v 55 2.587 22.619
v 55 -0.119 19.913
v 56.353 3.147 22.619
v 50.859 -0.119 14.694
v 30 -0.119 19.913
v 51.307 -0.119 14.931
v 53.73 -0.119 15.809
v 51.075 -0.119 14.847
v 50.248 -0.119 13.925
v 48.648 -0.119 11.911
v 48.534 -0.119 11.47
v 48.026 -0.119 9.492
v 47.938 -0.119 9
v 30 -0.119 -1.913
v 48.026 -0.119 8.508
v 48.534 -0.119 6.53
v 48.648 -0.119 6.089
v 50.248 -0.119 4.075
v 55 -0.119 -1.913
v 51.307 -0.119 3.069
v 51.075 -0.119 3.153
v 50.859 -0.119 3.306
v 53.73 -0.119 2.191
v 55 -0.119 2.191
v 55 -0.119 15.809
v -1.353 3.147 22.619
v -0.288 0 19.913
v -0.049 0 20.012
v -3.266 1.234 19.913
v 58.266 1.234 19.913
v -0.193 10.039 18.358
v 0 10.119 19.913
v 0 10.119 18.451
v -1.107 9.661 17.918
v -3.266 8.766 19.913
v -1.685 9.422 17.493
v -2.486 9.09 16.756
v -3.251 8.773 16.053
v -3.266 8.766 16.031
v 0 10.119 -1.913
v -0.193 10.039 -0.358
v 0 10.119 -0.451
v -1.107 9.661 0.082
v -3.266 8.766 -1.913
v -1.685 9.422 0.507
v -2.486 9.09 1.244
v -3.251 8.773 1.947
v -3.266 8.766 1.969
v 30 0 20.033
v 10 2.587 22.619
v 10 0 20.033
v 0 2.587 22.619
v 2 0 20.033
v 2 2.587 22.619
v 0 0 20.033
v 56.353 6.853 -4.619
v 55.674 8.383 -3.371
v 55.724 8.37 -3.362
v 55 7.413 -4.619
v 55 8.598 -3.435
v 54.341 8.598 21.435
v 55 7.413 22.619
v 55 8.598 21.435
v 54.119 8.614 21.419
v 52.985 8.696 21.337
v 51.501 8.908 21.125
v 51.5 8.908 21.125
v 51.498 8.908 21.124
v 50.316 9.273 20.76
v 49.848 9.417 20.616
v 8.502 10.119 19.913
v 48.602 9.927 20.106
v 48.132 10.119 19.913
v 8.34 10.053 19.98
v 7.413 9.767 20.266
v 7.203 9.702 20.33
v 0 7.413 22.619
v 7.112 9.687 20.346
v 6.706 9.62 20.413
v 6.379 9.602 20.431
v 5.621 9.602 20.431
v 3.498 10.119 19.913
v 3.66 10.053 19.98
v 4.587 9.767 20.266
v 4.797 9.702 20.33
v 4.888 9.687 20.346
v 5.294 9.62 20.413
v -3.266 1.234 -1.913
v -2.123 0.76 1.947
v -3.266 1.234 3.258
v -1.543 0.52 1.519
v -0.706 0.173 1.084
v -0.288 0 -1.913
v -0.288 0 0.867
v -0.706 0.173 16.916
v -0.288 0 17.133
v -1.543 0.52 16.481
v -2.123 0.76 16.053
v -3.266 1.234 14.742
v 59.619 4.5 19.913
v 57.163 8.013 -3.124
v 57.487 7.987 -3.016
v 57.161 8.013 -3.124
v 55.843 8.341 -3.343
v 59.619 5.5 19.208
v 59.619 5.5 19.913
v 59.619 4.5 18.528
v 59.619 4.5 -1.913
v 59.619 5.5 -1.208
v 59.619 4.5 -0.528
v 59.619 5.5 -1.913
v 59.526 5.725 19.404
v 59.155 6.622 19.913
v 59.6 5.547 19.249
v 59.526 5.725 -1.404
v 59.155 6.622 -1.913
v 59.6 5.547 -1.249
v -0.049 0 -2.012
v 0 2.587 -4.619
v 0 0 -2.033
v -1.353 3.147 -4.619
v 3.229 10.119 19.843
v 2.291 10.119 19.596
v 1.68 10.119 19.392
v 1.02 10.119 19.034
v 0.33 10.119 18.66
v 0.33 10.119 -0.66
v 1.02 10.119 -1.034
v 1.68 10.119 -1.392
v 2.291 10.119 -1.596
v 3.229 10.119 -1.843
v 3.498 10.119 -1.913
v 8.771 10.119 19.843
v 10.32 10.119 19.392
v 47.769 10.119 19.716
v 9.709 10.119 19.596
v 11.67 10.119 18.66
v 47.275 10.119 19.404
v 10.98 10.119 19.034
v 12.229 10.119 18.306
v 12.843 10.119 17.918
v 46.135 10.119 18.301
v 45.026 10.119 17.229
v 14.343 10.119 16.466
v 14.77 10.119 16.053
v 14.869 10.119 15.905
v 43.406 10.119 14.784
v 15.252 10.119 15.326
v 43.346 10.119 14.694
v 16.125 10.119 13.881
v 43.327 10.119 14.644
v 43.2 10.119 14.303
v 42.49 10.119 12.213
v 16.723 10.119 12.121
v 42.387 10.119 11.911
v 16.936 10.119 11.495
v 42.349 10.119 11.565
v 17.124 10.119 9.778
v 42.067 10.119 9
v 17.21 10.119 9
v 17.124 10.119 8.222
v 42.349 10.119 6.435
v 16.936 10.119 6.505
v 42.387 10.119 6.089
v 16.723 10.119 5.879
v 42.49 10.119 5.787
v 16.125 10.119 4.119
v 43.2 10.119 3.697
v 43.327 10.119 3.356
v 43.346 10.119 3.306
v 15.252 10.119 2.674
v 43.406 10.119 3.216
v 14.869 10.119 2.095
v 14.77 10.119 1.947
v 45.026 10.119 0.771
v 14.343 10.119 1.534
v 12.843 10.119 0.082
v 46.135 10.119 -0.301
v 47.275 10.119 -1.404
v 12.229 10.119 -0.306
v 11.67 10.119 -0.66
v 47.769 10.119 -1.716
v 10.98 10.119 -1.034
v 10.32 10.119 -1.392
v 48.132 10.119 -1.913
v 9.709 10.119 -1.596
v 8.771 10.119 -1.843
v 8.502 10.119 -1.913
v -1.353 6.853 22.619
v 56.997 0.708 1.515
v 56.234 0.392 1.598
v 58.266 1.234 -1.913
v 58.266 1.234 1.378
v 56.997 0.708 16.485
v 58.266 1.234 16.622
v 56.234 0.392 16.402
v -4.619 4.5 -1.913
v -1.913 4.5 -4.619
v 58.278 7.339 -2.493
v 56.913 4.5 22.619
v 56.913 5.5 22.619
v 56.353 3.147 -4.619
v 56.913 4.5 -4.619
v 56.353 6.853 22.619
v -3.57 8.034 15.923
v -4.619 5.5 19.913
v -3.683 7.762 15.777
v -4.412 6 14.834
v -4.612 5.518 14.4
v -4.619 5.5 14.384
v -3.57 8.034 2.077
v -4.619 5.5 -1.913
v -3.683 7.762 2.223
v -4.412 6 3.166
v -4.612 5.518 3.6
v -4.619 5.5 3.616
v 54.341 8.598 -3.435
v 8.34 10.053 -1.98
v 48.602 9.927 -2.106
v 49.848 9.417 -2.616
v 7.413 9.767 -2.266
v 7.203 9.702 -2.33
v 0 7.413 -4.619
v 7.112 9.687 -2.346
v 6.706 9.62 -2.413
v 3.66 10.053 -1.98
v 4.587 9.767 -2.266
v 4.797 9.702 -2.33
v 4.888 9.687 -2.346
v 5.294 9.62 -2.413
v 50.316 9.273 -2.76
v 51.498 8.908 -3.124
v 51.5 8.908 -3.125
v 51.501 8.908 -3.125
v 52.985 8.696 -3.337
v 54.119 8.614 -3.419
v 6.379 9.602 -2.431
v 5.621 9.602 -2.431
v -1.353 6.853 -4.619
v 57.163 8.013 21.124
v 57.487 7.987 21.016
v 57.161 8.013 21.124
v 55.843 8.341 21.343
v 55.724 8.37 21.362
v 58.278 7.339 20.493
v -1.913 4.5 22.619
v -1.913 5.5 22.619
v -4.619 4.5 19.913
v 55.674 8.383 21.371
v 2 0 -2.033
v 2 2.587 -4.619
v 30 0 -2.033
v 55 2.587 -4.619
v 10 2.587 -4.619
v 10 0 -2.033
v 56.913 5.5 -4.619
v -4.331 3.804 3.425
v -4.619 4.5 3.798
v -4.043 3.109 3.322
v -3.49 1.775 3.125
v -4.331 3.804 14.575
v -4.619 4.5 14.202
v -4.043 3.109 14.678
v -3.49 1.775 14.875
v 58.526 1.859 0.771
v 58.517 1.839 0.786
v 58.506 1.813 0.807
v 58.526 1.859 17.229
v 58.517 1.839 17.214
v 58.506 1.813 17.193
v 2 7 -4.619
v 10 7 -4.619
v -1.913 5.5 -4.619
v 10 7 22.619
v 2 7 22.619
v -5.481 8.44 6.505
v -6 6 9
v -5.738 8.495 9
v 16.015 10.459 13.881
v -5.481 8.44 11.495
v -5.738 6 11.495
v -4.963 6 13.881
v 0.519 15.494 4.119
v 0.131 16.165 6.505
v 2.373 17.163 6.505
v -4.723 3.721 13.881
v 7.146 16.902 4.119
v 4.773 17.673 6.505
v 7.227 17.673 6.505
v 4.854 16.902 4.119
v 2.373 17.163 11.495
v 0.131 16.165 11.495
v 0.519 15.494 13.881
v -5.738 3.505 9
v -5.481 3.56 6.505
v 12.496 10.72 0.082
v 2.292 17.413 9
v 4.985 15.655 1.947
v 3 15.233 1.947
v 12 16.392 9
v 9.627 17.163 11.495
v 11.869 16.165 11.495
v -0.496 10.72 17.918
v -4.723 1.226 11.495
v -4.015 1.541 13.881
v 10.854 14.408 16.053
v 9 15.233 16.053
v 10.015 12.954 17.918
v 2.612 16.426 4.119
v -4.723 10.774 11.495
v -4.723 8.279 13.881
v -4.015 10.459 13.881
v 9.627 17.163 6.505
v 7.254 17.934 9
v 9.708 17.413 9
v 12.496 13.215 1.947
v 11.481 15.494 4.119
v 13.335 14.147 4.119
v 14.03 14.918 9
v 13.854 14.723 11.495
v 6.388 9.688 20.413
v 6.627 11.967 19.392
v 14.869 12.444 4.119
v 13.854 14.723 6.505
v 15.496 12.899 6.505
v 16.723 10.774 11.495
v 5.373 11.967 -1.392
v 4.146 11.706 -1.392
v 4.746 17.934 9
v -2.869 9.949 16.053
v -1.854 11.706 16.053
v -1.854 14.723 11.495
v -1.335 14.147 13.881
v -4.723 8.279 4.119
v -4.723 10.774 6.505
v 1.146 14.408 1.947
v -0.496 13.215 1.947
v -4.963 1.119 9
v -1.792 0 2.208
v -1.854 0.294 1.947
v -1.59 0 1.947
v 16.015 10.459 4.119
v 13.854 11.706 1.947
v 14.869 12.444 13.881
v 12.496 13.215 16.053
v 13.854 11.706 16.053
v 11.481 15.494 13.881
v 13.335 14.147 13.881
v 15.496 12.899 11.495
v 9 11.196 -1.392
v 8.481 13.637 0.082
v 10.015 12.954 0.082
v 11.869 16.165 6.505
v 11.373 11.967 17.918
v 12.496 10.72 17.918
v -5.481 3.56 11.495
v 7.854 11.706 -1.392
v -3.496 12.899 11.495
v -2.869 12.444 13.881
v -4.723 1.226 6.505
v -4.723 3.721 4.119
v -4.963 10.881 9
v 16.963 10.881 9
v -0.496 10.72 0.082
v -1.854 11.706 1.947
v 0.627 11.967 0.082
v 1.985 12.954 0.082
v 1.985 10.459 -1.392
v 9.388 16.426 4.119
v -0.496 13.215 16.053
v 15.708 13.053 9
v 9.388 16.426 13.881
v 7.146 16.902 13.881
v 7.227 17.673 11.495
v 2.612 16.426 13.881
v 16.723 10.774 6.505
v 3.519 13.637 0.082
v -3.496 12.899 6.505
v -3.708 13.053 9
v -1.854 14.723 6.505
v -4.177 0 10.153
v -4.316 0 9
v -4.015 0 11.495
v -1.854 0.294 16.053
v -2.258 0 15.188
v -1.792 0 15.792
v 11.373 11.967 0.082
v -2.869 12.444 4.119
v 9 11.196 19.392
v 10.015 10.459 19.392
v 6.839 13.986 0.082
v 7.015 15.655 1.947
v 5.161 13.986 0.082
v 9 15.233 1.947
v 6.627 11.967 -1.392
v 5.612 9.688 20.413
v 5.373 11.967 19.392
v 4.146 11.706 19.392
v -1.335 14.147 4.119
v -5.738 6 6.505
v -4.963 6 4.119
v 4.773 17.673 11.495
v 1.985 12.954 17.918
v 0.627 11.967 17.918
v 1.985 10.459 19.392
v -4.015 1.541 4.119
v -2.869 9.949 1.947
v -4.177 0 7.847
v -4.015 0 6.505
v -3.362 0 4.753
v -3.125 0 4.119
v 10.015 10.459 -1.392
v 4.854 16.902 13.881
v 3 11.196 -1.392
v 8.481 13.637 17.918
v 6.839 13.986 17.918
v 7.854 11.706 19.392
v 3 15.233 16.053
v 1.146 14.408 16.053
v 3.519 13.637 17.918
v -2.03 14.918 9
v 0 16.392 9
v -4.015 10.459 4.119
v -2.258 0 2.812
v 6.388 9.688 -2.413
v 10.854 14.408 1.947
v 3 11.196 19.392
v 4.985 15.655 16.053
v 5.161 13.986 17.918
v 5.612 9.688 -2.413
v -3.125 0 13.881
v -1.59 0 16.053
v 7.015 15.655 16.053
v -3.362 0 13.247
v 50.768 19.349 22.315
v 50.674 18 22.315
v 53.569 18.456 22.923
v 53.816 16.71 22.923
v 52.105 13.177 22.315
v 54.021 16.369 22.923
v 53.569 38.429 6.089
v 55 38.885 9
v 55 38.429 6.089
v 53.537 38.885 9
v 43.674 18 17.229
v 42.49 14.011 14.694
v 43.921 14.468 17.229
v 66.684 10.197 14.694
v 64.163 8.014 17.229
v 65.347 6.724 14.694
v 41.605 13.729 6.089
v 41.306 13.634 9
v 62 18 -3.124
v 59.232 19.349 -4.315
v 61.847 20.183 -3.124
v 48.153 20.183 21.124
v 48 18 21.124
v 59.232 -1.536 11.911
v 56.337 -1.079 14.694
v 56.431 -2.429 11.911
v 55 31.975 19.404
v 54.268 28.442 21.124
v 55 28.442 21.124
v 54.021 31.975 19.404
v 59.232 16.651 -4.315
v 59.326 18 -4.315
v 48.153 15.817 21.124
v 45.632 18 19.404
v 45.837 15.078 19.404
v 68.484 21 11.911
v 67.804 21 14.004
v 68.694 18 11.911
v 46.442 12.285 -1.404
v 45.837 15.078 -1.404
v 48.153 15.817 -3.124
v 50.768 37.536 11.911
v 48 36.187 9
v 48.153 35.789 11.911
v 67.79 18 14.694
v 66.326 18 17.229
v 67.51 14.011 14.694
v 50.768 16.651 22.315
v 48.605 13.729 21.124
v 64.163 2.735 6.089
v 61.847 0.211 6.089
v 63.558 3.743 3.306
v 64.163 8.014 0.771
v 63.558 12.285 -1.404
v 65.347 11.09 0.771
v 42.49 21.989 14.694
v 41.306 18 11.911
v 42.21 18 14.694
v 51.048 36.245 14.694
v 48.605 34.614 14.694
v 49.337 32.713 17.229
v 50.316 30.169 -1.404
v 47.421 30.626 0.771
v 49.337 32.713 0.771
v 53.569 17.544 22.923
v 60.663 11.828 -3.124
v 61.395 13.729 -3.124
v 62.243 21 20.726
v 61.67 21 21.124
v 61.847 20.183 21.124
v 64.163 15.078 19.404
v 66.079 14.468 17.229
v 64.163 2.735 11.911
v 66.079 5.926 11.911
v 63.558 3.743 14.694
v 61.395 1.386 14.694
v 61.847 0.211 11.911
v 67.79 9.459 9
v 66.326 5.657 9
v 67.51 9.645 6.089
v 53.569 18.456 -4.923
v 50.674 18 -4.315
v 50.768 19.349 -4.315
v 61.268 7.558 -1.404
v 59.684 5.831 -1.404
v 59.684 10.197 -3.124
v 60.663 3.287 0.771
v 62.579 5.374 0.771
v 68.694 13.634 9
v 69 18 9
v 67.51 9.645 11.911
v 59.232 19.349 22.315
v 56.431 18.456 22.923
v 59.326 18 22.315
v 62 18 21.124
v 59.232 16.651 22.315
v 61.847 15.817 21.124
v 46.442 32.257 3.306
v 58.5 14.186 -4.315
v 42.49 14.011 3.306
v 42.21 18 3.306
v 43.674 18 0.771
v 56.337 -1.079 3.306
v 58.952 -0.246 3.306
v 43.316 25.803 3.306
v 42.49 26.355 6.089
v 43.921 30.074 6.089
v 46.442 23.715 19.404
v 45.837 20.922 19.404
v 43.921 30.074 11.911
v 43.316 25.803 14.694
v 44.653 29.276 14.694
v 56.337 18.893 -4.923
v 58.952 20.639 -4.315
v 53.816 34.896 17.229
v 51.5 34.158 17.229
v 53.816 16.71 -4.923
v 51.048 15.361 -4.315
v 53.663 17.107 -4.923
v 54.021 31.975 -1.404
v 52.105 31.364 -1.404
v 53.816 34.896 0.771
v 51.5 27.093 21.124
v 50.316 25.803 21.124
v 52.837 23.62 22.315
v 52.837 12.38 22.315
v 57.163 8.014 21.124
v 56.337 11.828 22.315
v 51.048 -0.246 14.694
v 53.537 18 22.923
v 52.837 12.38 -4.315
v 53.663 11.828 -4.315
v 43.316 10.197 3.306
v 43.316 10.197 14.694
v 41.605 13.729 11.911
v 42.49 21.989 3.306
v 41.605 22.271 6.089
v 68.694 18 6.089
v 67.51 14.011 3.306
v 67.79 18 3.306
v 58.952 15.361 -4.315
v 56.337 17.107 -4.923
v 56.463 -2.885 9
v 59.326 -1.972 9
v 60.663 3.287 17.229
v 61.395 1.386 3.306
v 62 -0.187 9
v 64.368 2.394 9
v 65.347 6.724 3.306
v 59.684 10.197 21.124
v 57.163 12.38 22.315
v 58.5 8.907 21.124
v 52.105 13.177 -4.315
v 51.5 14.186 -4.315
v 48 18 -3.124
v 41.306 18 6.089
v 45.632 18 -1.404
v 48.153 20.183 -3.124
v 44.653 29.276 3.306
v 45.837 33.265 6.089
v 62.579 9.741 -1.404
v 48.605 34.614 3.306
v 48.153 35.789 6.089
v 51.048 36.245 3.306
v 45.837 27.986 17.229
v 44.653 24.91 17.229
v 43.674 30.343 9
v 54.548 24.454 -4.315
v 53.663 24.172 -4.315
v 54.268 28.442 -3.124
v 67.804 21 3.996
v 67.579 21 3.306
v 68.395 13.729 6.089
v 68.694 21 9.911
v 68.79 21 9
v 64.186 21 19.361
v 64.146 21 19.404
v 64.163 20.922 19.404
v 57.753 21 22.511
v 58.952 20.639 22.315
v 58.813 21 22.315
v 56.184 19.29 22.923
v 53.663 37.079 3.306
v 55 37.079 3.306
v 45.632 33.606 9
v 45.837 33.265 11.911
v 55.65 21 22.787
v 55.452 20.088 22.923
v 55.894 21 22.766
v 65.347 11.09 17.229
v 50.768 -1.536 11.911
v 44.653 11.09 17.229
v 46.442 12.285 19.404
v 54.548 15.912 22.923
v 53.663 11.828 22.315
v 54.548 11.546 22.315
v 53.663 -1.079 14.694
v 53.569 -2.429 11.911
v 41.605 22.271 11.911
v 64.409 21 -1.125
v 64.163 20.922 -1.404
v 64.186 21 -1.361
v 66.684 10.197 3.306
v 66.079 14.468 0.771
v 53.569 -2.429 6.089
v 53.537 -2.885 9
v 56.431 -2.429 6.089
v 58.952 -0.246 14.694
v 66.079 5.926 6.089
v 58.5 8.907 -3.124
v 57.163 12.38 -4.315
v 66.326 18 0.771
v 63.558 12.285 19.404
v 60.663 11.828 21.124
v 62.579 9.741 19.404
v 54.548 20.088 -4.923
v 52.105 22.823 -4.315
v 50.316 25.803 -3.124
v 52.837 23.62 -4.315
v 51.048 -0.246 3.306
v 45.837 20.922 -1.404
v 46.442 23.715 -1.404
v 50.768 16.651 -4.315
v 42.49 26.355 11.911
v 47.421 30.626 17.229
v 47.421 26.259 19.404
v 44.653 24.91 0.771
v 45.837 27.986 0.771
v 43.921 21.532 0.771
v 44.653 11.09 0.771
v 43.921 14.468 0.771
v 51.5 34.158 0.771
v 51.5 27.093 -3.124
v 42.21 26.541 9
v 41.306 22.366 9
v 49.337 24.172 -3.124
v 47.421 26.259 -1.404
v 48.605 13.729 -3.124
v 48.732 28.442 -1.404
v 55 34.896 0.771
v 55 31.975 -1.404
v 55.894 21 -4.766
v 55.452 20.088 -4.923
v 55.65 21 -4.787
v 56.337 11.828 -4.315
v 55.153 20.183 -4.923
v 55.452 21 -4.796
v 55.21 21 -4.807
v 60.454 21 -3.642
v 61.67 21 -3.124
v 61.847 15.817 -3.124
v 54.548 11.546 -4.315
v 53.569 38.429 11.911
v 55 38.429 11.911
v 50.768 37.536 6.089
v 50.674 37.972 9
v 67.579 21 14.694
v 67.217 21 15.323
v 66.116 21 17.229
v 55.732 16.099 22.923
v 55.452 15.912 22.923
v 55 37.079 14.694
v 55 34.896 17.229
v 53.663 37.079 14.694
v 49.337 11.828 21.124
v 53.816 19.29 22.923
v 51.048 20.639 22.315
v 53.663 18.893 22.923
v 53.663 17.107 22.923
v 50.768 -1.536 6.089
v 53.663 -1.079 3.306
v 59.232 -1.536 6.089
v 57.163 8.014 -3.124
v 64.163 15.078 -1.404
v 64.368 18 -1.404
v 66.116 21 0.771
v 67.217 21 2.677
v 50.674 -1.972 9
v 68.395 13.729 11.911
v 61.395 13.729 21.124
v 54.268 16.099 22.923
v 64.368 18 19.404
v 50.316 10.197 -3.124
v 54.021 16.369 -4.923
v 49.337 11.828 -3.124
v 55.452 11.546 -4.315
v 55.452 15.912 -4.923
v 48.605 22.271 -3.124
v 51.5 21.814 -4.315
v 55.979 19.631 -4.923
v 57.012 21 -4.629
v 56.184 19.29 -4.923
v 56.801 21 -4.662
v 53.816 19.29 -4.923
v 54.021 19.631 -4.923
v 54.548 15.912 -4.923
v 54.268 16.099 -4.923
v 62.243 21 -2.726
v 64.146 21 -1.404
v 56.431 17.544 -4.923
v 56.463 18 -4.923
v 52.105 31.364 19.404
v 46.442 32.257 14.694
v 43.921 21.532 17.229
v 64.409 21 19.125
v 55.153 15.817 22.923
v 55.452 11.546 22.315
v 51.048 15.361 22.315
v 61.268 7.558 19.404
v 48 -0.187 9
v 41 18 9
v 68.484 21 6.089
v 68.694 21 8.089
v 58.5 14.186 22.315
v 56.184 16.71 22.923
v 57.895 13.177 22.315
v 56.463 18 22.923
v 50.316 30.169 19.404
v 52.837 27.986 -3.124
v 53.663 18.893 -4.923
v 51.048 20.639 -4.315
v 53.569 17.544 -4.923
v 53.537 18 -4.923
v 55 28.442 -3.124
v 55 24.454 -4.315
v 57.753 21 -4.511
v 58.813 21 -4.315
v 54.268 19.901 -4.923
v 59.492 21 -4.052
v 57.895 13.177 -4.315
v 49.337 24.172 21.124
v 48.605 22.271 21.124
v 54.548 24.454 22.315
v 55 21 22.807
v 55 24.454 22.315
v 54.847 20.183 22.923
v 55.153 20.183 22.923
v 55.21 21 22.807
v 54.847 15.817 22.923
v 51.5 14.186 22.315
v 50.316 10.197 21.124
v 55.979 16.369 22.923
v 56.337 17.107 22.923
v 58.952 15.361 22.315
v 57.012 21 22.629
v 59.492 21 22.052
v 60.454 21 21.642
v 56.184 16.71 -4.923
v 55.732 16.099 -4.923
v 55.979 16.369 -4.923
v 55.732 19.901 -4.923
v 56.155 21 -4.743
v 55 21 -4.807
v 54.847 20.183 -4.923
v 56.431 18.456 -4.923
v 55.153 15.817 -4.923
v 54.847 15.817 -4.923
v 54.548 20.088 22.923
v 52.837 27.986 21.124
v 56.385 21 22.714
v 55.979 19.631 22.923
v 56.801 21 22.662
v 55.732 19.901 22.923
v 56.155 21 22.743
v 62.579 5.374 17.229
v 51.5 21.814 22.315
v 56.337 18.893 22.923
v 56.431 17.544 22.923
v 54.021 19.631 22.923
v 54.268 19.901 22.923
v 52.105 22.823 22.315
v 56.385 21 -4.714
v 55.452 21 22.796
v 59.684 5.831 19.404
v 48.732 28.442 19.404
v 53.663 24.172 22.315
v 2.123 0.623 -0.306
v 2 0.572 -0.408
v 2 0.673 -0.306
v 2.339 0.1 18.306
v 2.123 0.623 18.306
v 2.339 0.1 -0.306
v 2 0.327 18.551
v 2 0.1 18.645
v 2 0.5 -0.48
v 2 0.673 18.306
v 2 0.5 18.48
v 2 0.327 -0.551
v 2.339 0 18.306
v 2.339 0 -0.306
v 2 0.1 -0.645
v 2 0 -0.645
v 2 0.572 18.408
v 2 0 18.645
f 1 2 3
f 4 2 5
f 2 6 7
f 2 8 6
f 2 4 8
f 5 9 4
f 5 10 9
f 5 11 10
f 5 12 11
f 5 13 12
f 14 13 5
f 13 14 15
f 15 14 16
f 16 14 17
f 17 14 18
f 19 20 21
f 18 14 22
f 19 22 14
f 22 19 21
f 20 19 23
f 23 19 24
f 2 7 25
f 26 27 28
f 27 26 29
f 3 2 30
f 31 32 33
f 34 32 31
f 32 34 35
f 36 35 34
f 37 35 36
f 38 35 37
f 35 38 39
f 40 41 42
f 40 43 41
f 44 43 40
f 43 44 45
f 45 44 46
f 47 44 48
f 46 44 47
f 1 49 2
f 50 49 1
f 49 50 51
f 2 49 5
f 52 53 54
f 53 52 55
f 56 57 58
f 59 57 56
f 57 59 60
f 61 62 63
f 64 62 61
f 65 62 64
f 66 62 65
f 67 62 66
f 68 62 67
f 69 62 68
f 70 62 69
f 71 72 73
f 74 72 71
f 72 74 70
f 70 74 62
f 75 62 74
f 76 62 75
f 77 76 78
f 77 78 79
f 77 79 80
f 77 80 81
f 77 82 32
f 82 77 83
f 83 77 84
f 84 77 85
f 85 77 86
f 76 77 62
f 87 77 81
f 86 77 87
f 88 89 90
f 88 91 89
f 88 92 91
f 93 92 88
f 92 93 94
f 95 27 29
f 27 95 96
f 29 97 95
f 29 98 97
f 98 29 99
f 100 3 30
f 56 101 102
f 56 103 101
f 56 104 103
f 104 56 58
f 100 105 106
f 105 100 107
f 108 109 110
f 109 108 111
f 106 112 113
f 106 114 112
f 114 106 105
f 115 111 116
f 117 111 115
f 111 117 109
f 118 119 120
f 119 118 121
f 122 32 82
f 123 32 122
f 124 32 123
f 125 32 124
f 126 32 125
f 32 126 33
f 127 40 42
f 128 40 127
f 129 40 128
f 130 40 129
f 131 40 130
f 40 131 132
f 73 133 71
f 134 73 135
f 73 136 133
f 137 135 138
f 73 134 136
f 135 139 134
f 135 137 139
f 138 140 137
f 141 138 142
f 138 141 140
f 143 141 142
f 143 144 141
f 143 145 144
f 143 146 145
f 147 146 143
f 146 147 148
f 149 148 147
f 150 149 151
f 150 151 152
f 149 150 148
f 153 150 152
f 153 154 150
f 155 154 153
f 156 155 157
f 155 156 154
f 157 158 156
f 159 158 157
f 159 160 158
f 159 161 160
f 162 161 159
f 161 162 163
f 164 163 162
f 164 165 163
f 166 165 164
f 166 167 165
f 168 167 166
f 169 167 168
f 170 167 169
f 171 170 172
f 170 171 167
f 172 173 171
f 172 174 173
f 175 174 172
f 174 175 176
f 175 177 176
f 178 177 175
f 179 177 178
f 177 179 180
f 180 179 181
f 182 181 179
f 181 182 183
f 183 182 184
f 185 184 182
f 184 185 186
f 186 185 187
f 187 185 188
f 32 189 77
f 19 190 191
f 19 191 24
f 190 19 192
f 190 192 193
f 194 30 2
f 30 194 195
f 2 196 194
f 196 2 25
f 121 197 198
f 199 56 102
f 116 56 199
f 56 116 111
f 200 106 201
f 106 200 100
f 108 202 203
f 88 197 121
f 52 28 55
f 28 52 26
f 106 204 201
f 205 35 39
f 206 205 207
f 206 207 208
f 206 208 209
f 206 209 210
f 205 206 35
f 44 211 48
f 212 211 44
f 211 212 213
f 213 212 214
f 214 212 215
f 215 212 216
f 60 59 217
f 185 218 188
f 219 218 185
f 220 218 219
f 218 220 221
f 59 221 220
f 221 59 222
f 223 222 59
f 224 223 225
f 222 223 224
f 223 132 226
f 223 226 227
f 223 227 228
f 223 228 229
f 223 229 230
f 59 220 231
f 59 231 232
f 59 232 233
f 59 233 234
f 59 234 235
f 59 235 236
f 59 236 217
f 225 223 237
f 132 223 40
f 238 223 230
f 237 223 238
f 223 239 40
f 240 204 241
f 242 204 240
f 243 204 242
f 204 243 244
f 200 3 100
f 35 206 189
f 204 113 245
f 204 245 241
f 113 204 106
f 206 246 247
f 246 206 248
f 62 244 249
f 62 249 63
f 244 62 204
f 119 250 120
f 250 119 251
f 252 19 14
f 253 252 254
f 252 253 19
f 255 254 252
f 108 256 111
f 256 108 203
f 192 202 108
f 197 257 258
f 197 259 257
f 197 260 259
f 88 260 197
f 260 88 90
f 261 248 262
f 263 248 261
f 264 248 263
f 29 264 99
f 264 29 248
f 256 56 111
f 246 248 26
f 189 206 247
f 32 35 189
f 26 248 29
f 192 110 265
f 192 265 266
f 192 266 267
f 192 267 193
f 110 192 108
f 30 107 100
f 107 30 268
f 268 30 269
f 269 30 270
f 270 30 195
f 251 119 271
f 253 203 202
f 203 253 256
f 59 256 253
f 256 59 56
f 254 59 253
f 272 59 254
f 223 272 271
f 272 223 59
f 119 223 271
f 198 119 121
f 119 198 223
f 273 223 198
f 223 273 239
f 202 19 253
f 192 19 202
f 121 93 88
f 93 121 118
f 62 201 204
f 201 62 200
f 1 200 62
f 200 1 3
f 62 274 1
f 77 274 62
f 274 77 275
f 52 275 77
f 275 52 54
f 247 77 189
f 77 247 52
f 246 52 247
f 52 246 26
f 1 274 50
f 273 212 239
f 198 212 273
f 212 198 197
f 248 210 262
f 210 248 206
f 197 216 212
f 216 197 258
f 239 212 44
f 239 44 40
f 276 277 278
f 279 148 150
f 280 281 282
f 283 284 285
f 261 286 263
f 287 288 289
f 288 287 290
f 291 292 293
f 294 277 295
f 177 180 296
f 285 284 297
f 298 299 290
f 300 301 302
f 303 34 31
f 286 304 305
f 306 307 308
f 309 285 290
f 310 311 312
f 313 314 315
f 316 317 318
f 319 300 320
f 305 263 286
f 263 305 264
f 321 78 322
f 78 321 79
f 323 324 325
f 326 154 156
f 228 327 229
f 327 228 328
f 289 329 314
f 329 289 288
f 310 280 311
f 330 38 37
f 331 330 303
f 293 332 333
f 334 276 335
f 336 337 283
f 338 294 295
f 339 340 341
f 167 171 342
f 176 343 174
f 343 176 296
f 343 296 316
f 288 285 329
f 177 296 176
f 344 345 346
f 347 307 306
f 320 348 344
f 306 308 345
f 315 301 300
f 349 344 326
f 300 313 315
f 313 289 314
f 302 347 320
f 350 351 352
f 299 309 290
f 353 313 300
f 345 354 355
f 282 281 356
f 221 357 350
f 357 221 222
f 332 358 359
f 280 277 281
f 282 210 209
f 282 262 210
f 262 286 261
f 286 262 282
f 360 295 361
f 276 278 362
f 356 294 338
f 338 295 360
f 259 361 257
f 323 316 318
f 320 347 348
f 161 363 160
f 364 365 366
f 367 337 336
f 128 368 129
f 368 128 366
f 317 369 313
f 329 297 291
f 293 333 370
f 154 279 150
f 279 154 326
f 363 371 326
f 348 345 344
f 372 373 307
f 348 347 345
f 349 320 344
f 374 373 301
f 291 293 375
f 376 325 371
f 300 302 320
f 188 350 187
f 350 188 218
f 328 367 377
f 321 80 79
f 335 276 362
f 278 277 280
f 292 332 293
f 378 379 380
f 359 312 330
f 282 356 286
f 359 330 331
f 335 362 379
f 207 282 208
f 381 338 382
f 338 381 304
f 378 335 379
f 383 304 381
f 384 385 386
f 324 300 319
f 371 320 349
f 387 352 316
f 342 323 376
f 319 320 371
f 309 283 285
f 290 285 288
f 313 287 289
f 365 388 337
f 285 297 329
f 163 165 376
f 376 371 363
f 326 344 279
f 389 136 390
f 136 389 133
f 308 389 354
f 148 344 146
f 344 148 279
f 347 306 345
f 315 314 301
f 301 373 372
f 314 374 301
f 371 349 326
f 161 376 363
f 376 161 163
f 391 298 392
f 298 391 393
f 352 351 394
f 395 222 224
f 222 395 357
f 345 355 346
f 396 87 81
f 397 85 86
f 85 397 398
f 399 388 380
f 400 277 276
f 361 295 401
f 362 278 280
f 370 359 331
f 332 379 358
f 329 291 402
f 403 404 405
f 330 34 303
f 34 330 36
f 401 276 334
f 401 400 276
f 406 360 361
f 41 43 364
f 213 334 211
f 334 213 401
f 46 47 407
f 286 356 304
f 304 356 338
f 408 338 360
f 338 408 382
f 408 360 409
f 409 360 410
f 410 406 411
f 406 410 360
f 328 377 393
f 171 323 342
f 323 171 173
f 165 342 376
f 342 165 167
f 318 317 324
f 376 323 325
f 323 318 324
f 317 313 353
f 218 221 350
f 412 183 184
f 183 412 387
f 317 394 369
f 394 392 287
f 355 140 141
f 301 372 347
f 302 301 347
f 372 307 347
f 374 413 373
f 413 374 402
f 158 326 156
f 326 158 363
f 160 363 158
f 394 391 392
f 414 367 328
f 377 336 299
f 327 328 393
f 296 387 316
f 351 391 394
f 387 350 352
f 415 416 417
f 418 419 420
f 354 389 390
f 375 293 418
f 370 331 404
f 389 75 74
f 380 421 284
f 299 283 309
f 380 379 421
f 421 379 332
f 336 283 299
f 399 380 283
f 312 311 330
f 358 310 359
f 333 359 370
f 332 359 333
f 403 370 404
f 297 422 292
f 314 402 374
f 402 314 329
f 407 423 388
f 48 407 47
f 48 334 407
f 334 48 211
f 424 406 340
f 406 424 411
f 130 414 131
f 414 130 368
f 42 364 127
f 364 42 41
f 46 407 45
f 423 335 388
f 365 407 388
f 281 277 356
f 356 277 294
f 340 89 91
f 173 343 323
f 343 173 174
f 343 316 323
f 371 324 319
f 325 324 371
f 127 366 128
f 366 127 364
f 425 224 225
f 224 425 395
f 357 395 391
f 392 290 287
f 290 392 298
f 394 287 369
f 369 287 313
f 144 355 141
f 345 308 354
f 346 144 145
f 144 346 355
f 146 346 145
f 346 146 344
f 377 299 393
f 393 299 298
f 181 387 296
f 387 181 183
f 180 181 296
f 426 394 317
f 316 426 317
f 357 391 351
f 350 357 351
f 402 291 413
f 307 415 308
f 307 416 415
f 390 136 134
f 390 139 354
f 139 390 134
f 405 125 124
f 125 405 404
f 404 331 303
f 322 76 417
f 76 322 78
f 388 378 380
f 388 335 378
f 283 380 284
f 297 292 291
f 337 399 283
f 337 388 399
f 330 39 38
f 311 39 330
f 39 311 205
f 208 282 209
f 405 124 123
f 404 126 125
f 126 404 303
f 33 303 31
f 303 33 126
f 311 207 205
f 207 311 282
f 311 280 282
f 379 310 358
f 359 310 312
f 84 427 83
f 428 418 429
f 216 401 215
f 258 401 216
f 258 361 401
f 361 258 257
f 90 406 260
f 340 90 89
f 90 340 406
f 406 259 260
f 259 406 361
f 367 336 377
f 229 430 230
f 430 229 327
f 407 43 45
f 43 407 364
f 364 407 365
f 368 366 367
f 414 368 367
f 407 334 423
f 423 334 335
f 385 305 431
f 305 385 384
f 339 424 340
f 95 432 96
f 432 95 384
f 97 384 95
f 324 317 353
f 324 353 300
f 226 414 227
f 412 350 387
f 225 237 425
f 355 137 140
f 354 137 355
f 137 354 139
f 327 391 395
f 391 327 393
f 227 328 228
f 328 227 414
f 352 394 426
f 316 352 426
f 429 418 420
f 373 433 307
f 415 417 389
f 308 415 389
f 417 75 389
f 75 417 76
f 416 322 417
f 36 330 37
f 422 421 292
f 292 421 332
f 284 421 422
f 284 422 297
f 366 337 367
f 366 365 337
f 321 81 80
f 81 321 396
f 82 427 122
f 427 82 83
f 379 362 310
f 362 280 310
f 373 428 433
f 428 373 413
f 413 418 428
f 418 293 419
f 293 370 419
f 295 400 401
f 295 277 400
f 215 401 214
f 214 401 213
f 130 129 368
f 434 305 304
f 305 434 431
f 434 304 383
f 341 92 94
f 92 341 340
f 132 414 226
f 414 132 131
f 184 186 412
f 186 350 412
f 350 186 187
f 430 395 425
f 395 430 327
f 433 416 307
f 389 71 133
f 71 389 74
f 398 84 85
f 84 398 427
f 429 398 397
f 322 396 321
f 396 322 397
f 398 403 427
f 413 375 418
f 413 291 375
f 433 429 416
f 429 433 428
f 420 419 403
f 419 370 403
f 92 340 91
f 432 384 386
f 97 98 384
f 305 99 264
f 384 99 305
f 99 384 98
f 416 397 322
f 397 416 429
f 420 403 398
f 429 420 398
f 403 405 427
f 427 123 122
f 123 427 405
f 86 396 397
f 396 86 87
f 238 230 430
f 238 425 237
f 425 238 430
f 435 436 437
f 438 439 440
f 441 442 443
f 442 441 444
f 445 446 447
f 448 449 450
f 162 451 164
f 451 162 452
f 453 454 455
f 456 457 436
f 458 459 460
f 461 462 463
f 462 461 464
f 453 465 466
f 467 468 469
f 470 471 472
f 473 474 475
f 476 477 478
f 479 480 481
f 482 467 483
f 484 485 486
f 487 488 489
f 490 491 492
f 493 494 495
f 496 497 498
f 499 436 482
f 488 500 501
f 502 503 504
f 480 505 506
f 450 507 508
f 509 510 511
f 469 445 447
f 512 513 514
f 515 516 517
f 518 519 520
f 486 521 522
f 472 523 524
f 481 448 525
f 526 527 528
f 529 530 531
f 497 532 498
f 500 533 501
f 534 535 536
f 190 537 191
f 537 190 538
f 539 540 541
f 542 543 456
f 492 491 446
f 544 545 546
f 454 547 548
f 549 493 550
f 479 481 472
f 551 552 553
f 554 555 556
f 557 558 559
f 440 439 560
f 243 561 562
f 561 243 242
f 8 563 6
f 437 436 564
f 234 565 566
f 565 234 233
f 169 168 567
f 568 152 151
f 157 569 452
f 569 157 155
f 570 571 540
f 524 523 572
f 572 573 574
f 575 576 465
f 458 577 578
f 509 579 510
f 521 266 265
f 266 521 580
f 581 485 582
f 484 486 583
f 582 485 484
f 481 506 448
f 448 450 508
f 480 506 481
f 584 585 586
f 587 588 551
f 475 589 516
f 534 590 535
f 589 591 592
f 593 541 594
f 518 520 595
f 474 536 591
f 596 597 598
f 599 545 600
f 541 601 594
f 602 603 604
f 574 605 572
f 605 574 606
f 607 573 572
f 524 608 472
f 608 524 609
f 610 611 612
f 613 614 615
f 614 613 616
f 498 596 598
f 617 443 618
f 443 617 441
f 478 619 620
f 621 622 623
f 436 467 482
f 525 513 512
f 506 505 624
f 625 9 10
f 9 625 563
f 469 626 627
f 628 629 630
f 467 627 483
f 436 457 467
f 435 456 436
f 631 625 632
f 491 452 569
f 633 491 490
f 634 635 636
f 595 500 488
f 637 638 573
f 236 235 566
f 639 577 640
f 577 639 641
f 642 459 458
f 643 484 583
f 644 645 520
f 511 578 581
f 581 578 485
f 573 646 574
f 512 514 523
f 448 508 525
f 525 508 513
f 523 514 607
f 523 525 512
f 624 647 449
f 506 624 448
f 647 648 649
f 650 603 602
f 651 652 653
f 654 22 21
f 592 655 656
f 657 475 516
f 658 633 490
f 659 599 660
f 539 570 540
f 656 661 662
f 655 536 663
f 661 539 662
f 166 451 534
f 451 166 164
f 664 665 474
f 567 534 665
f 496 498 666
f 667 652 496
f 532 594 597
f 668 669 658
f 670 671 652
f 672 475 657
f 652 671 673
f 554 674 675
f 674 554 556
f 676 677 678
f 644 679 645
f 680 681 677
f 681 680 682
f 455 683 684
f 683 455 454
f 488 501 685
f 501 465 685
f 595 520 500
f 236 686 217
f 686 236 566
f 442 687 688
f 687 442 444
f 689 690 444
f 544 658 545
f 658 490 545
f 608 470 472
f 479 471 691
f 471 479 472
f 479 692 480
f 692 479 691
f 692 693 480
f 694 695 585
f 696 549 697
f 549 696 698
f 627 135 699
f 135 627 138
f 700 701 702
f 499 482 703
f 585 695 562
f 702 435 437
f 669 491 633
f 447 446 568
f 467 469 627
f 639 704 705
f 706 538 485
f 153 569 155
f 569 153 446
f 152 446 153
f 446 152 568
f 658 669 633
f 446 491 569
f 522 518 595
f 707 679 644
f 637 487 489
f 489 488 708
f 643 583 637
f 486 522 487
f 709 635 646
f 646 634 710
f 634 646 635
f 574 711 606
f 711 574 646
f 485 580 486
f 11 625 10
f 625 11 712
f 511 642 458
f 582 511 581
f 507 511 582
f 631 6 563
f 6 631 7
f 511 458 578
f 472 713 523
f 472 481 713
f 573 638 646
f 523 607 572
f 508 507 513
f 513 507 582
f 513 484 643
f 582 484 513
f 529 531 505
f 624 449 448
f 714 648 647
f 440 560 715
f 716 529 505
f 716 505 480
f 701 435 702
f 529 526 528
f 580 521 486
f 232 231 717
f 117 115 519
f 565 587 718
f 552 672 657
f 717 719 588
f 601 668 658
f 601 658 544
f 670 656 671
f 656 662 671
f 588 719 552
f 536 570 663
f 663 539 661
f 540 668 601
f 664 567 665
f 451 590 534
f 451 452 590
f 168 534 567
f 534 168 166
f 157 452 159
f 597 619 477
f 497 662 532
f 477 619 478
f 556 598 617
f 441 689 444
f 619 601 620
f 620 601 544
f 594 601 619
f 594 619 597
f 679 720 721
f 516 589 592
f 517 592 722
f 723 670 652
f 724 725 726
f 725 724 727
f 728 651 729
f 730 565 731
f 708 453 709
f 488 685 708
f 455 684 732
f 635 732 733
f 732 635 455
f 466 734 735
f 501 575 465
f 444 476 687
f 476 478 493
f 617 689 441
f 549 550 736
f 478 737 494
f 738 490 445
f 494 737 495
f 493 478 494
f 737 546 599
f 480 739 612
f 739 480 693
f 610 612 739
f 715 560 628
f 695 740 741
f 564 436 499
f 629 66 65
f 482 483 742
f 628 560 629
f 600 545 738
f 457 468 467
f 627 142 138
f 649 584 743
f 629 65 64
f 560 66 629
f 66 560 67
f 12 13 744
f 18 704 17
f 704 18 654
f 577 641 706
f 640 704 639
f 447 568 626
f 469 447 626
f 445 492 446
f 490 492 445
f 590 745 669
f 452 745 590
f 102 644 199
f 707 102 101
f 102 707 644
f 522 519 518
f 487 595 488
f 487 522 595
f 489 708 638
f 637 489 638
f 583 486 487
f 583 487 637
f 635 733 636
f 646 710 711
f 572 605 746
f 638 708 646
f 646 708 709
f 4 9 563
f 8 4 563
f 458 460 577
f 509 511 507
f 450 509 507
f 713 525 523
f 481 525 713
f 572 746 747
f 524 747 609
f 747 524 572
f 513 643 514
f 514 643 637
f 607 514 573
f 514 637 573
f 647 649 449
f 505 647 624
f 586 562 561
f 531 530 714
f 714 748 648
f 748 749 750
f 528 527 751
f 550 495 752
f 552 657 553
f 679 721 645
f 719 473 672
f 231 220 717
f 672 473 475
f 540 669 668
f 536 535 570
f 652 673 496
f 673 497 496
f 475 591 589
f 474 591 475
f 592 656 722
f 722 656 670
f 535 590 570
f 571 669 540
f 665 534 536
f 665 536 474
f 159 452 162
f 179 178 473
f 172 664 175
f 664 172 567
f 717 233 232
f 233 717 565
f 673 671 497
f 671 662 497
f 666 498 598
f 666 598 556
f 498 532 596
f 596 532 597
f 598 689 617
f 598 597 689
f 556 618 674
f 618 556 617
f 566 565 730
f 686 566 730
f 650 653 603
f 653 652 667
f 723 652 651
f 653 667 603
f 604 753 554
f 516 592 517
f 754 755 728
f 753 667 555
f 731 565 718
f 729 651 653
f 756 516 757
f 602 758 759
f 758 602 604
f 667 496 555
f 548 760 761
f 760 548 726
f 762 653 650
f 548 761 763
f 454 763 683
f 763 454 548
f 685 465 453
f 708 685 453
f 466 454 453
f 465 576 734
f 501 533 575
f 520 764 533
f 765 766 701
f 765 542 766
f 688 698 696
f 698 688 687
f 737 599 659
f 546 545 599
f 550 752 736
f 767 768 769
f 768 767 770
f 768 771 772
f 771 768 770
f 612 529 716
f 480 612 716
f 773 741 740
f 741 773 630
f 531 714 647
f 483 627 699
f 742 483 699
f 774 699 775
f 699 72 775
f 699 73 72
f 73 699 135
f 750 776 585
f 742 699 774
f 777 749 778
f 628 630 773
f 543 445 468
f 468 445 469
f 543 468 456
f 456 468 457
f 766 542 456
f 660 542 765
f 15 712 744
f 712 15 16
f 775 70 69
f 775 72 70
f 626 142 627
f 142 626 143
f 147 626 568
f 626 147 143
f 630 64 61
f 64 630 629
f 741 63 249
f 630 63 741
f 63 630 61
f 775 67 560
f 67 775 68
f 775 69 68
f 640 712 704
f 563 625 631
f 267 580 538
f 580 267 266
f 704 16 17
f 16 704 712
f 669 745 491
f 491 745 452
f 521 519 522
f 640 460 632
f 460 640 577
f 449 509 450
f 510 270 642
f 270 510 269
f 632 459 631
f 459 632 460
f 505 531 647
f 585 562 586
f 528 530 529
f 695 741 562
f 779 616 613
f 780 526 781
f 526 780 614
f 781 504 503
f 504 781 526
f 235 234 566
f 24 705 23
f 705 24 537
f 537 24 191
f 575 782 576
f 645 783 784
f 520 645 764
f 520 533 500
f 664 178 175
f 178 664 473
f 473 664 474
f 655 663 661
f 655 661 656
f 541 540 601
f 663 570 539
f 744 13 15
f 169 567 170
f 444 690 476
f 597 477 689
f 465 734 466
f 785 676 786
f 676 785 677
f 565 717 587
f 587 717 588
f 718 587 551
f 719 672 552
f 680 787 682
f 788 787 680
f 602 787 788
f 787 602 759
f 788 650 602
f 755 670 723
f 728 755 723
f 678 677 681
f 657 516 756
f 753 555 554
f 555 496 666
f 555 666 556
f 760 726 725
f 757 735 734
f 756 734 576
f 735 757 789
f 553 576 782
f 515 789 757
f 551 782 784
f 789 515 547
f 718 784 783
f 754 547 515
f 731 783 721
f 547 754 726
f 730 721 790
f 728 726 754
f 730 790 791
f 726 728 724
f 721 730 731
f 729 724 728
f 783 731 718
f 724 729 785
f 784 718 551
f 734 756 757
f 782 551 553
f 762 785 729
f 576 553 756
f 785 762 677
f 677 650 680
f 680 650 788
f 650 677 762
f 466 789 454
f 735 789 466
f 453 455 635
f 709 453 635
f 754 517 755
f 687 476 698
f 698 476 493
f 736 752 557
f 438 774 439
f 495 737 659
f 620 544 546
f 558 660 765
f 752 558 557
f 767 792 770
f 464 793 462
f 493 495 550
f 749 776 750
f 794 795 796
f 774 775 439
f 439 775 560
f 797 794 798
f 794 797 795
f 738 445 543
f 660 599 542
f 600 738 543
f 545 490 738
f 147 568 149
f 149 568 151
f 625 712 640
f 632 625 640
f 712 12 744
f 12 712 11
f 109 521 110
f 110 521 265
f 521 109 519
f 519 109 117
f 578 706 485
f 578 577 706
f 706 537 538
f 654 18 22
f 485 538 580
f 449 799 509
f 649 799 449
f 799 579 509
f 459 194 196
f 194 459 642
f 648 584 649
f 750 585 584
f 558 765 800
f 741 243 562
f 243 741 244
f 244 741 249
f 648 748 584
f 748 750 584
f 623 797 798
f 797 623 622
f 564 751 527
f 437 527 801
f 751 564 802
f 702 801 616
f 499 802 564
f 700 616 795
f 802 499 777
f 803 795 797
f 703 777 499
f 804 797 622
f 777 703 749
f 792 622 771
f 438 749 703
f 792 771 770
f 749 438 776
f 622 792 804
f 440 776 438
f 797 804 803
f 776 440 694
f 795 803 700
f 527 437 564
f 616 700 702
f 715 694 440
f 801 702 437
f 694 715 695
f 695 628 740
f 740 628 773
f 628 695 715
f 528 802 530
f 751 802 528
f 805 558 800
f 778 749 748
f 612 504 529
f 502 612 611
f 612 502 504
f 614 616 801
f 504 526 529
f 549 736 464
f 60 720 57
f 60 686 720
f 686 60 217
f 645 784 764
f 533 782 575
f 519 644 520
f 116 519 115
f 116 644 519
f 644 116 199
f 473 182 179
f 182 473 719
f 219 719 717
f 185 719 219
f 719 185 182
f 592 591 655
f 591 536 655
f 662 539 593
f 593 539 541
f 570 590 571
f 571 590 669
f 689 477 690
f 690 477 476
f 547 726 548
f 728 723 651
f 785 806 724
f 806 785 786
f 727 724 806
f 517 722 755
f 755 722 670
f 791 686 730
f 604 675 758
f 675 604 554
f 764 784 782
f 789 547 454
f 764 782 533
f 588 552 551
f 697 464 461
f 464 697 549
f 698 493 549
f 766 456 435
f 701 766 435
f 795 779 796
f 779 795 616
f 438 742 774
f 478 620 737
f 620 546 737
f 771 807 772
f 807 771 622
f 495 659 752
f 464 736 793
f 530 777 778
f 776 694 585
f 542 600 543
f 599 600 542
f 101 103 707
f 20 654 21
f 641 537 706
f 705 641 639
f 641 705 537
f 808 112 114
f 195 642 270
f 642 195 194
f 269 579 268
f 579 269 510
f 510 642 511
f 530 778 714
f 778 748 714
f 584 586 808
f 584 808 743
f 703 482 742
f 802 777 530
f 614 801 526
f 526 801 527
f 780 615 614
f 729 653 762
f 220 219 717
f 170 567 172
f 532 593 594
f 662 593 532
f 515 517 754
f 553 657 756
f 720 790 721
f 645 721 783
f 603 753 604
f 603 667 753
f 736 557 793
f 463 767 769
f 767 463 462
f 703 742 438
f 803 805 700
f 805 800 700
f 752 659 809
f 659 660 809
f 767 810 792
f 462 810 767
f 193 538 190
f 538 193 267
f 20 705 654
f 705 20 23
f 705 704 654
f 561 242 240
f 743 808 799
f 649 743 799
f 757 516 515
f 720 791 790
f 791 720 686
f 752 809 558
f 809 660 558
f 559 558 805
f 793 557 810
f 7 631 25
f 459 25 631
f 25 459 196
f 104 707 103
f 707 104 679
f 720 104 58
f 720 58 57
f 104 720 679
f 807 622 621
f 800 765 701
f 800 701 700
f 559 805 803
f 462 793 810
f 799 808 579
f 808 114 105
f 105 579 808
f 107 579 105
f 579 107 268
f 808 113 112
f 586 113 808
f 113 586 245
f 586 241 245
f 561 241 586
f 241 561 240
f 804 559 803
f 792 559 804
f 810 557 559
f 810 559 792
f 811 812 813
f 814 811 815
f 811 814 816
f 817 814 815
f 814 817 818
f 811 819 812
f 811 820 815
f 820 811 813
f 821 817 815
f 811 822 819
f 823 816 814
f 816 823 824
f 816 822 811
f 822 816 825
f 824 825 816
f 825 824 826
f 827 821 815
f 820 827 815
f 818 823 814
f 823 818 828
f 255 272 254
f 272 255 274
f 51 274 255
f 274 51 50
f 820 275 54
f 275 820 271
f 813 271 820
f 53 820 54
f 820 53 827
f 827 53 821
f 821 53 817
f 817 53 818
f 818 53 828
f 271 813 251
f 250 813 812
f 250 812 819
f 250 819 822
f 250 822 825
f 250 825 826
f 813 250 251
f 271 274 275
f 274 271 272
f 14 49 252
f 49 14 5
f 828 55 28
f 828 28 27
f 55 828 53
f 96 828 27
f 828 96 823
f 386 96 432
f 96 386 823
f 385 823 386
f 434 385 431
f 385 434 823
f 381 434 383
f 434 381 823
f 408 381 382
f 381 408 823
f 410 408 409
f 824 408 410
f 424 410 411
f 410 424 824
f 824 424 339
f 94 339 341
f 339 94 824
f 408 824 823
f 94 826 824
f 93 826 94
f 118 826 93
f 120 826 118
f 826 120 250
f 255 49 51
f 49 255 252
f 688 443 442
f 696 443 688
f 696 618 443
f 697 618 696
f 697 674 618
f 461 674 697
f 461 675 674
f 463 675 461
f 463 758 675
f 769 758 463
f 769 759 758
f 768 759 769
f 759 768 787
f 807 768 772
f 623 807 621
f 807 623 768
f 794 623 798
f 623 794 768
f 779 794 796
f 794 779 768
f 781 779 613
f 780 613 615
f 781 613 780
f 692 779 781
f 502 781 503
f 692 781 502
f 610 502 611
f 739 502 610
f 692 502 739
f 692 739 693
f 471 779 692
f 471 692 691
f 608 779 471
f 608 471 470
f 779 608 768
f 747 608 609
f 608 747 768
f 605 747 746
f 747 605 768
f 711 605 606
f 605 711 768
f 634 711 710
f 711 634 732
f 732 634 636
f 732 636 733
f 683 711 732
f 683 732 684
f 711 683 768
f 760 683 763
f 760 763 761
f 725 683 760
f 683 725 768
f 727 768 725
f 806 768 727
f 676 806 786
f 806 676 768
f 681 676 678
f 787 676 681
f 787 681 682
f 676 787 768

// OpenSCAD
center=false;
trunk_height=55;
trunk_thickness=10;
support_thickness=4;
base_span=36;
width=18;
pocket_offset=17;


difference() {
  union() {
      
      fillet(r=5,steps=5) {
          translate([0, 4.5, 0])
    cube([trunk_height, 1, width], center);
//    translate([trunk_height - support_thickness, 0, 0])
//      cube([support_thickness, base_span, width], center);
      }
          
//    translate([trunk_height, pocket_offset, 0])
//      cube([16, support_thickness, width], center);
//      
    
      
    translate([6, 6, width/2])
//      cylinder(width, 10, 10, false);
      sphere(12);
      
//    fillet(r=2,steps=1) {
    scale([1, 1.5, 1])  
    translate([trunk_height, 12, width/2])
      //cylinder(width, 10, 10, false);
      sphere(14);
//    }
  }
  
  difference() {
  translate([2, -1, -10])
      cube([8, 7+1, width+20], center);
      
      fillet(r=0.8, steps=5) {
      translate([1.1,-0.4,0])
      cube([0.5, 0.5, width], center);
      }
      
  }
  
  translate([-10, -10, -10])
      cube([40, 10, width+20], center);
  
  translate([trunk_height, pocket_offset + support_thickness, -10])
      cube([20, 20, width+20], center);
  
  
}


// Fillet function

module fillet(r=1.0,steps=3,include=true) {
  if(include) for (k=[0:$children-1]) {
	children(k);
  }
  for (i=[0:$children-2] ) {
    for(j=[i+1:$children-1] ) {
	fillet_two(r=r,steps=steps) {
	  children(i);
	  children(j);
	  intersection() {
		children(i);
		children(j);
	  }
	}
    }
  }
}

module fillet_two(r=1.0,steps=3) {
  for(step=[1:steps]) {
	hull() {
	  render() intersection() {
		children(0);
		offset_3d(r=r*step/steps) children(2);
	  }
	  render() intersection() {
		children(1);
		offset_3d(r=r*(steps-step+1)/steps) children(2);
	  }
	}
  }
}

module offset_3d(r=1.0) {
  for(k=[0:$children-1]) minkowski() {
	children(k);
	sphere(r=r,$fn=8);
  }
}

//fillet(r=2,steps=5) {
//	cylinder(r=5,h=10);
//	cube([10,10,2]);
//	rotate([30,30,30]) cylinder(r=1.0,h=50,center=true);
//}
